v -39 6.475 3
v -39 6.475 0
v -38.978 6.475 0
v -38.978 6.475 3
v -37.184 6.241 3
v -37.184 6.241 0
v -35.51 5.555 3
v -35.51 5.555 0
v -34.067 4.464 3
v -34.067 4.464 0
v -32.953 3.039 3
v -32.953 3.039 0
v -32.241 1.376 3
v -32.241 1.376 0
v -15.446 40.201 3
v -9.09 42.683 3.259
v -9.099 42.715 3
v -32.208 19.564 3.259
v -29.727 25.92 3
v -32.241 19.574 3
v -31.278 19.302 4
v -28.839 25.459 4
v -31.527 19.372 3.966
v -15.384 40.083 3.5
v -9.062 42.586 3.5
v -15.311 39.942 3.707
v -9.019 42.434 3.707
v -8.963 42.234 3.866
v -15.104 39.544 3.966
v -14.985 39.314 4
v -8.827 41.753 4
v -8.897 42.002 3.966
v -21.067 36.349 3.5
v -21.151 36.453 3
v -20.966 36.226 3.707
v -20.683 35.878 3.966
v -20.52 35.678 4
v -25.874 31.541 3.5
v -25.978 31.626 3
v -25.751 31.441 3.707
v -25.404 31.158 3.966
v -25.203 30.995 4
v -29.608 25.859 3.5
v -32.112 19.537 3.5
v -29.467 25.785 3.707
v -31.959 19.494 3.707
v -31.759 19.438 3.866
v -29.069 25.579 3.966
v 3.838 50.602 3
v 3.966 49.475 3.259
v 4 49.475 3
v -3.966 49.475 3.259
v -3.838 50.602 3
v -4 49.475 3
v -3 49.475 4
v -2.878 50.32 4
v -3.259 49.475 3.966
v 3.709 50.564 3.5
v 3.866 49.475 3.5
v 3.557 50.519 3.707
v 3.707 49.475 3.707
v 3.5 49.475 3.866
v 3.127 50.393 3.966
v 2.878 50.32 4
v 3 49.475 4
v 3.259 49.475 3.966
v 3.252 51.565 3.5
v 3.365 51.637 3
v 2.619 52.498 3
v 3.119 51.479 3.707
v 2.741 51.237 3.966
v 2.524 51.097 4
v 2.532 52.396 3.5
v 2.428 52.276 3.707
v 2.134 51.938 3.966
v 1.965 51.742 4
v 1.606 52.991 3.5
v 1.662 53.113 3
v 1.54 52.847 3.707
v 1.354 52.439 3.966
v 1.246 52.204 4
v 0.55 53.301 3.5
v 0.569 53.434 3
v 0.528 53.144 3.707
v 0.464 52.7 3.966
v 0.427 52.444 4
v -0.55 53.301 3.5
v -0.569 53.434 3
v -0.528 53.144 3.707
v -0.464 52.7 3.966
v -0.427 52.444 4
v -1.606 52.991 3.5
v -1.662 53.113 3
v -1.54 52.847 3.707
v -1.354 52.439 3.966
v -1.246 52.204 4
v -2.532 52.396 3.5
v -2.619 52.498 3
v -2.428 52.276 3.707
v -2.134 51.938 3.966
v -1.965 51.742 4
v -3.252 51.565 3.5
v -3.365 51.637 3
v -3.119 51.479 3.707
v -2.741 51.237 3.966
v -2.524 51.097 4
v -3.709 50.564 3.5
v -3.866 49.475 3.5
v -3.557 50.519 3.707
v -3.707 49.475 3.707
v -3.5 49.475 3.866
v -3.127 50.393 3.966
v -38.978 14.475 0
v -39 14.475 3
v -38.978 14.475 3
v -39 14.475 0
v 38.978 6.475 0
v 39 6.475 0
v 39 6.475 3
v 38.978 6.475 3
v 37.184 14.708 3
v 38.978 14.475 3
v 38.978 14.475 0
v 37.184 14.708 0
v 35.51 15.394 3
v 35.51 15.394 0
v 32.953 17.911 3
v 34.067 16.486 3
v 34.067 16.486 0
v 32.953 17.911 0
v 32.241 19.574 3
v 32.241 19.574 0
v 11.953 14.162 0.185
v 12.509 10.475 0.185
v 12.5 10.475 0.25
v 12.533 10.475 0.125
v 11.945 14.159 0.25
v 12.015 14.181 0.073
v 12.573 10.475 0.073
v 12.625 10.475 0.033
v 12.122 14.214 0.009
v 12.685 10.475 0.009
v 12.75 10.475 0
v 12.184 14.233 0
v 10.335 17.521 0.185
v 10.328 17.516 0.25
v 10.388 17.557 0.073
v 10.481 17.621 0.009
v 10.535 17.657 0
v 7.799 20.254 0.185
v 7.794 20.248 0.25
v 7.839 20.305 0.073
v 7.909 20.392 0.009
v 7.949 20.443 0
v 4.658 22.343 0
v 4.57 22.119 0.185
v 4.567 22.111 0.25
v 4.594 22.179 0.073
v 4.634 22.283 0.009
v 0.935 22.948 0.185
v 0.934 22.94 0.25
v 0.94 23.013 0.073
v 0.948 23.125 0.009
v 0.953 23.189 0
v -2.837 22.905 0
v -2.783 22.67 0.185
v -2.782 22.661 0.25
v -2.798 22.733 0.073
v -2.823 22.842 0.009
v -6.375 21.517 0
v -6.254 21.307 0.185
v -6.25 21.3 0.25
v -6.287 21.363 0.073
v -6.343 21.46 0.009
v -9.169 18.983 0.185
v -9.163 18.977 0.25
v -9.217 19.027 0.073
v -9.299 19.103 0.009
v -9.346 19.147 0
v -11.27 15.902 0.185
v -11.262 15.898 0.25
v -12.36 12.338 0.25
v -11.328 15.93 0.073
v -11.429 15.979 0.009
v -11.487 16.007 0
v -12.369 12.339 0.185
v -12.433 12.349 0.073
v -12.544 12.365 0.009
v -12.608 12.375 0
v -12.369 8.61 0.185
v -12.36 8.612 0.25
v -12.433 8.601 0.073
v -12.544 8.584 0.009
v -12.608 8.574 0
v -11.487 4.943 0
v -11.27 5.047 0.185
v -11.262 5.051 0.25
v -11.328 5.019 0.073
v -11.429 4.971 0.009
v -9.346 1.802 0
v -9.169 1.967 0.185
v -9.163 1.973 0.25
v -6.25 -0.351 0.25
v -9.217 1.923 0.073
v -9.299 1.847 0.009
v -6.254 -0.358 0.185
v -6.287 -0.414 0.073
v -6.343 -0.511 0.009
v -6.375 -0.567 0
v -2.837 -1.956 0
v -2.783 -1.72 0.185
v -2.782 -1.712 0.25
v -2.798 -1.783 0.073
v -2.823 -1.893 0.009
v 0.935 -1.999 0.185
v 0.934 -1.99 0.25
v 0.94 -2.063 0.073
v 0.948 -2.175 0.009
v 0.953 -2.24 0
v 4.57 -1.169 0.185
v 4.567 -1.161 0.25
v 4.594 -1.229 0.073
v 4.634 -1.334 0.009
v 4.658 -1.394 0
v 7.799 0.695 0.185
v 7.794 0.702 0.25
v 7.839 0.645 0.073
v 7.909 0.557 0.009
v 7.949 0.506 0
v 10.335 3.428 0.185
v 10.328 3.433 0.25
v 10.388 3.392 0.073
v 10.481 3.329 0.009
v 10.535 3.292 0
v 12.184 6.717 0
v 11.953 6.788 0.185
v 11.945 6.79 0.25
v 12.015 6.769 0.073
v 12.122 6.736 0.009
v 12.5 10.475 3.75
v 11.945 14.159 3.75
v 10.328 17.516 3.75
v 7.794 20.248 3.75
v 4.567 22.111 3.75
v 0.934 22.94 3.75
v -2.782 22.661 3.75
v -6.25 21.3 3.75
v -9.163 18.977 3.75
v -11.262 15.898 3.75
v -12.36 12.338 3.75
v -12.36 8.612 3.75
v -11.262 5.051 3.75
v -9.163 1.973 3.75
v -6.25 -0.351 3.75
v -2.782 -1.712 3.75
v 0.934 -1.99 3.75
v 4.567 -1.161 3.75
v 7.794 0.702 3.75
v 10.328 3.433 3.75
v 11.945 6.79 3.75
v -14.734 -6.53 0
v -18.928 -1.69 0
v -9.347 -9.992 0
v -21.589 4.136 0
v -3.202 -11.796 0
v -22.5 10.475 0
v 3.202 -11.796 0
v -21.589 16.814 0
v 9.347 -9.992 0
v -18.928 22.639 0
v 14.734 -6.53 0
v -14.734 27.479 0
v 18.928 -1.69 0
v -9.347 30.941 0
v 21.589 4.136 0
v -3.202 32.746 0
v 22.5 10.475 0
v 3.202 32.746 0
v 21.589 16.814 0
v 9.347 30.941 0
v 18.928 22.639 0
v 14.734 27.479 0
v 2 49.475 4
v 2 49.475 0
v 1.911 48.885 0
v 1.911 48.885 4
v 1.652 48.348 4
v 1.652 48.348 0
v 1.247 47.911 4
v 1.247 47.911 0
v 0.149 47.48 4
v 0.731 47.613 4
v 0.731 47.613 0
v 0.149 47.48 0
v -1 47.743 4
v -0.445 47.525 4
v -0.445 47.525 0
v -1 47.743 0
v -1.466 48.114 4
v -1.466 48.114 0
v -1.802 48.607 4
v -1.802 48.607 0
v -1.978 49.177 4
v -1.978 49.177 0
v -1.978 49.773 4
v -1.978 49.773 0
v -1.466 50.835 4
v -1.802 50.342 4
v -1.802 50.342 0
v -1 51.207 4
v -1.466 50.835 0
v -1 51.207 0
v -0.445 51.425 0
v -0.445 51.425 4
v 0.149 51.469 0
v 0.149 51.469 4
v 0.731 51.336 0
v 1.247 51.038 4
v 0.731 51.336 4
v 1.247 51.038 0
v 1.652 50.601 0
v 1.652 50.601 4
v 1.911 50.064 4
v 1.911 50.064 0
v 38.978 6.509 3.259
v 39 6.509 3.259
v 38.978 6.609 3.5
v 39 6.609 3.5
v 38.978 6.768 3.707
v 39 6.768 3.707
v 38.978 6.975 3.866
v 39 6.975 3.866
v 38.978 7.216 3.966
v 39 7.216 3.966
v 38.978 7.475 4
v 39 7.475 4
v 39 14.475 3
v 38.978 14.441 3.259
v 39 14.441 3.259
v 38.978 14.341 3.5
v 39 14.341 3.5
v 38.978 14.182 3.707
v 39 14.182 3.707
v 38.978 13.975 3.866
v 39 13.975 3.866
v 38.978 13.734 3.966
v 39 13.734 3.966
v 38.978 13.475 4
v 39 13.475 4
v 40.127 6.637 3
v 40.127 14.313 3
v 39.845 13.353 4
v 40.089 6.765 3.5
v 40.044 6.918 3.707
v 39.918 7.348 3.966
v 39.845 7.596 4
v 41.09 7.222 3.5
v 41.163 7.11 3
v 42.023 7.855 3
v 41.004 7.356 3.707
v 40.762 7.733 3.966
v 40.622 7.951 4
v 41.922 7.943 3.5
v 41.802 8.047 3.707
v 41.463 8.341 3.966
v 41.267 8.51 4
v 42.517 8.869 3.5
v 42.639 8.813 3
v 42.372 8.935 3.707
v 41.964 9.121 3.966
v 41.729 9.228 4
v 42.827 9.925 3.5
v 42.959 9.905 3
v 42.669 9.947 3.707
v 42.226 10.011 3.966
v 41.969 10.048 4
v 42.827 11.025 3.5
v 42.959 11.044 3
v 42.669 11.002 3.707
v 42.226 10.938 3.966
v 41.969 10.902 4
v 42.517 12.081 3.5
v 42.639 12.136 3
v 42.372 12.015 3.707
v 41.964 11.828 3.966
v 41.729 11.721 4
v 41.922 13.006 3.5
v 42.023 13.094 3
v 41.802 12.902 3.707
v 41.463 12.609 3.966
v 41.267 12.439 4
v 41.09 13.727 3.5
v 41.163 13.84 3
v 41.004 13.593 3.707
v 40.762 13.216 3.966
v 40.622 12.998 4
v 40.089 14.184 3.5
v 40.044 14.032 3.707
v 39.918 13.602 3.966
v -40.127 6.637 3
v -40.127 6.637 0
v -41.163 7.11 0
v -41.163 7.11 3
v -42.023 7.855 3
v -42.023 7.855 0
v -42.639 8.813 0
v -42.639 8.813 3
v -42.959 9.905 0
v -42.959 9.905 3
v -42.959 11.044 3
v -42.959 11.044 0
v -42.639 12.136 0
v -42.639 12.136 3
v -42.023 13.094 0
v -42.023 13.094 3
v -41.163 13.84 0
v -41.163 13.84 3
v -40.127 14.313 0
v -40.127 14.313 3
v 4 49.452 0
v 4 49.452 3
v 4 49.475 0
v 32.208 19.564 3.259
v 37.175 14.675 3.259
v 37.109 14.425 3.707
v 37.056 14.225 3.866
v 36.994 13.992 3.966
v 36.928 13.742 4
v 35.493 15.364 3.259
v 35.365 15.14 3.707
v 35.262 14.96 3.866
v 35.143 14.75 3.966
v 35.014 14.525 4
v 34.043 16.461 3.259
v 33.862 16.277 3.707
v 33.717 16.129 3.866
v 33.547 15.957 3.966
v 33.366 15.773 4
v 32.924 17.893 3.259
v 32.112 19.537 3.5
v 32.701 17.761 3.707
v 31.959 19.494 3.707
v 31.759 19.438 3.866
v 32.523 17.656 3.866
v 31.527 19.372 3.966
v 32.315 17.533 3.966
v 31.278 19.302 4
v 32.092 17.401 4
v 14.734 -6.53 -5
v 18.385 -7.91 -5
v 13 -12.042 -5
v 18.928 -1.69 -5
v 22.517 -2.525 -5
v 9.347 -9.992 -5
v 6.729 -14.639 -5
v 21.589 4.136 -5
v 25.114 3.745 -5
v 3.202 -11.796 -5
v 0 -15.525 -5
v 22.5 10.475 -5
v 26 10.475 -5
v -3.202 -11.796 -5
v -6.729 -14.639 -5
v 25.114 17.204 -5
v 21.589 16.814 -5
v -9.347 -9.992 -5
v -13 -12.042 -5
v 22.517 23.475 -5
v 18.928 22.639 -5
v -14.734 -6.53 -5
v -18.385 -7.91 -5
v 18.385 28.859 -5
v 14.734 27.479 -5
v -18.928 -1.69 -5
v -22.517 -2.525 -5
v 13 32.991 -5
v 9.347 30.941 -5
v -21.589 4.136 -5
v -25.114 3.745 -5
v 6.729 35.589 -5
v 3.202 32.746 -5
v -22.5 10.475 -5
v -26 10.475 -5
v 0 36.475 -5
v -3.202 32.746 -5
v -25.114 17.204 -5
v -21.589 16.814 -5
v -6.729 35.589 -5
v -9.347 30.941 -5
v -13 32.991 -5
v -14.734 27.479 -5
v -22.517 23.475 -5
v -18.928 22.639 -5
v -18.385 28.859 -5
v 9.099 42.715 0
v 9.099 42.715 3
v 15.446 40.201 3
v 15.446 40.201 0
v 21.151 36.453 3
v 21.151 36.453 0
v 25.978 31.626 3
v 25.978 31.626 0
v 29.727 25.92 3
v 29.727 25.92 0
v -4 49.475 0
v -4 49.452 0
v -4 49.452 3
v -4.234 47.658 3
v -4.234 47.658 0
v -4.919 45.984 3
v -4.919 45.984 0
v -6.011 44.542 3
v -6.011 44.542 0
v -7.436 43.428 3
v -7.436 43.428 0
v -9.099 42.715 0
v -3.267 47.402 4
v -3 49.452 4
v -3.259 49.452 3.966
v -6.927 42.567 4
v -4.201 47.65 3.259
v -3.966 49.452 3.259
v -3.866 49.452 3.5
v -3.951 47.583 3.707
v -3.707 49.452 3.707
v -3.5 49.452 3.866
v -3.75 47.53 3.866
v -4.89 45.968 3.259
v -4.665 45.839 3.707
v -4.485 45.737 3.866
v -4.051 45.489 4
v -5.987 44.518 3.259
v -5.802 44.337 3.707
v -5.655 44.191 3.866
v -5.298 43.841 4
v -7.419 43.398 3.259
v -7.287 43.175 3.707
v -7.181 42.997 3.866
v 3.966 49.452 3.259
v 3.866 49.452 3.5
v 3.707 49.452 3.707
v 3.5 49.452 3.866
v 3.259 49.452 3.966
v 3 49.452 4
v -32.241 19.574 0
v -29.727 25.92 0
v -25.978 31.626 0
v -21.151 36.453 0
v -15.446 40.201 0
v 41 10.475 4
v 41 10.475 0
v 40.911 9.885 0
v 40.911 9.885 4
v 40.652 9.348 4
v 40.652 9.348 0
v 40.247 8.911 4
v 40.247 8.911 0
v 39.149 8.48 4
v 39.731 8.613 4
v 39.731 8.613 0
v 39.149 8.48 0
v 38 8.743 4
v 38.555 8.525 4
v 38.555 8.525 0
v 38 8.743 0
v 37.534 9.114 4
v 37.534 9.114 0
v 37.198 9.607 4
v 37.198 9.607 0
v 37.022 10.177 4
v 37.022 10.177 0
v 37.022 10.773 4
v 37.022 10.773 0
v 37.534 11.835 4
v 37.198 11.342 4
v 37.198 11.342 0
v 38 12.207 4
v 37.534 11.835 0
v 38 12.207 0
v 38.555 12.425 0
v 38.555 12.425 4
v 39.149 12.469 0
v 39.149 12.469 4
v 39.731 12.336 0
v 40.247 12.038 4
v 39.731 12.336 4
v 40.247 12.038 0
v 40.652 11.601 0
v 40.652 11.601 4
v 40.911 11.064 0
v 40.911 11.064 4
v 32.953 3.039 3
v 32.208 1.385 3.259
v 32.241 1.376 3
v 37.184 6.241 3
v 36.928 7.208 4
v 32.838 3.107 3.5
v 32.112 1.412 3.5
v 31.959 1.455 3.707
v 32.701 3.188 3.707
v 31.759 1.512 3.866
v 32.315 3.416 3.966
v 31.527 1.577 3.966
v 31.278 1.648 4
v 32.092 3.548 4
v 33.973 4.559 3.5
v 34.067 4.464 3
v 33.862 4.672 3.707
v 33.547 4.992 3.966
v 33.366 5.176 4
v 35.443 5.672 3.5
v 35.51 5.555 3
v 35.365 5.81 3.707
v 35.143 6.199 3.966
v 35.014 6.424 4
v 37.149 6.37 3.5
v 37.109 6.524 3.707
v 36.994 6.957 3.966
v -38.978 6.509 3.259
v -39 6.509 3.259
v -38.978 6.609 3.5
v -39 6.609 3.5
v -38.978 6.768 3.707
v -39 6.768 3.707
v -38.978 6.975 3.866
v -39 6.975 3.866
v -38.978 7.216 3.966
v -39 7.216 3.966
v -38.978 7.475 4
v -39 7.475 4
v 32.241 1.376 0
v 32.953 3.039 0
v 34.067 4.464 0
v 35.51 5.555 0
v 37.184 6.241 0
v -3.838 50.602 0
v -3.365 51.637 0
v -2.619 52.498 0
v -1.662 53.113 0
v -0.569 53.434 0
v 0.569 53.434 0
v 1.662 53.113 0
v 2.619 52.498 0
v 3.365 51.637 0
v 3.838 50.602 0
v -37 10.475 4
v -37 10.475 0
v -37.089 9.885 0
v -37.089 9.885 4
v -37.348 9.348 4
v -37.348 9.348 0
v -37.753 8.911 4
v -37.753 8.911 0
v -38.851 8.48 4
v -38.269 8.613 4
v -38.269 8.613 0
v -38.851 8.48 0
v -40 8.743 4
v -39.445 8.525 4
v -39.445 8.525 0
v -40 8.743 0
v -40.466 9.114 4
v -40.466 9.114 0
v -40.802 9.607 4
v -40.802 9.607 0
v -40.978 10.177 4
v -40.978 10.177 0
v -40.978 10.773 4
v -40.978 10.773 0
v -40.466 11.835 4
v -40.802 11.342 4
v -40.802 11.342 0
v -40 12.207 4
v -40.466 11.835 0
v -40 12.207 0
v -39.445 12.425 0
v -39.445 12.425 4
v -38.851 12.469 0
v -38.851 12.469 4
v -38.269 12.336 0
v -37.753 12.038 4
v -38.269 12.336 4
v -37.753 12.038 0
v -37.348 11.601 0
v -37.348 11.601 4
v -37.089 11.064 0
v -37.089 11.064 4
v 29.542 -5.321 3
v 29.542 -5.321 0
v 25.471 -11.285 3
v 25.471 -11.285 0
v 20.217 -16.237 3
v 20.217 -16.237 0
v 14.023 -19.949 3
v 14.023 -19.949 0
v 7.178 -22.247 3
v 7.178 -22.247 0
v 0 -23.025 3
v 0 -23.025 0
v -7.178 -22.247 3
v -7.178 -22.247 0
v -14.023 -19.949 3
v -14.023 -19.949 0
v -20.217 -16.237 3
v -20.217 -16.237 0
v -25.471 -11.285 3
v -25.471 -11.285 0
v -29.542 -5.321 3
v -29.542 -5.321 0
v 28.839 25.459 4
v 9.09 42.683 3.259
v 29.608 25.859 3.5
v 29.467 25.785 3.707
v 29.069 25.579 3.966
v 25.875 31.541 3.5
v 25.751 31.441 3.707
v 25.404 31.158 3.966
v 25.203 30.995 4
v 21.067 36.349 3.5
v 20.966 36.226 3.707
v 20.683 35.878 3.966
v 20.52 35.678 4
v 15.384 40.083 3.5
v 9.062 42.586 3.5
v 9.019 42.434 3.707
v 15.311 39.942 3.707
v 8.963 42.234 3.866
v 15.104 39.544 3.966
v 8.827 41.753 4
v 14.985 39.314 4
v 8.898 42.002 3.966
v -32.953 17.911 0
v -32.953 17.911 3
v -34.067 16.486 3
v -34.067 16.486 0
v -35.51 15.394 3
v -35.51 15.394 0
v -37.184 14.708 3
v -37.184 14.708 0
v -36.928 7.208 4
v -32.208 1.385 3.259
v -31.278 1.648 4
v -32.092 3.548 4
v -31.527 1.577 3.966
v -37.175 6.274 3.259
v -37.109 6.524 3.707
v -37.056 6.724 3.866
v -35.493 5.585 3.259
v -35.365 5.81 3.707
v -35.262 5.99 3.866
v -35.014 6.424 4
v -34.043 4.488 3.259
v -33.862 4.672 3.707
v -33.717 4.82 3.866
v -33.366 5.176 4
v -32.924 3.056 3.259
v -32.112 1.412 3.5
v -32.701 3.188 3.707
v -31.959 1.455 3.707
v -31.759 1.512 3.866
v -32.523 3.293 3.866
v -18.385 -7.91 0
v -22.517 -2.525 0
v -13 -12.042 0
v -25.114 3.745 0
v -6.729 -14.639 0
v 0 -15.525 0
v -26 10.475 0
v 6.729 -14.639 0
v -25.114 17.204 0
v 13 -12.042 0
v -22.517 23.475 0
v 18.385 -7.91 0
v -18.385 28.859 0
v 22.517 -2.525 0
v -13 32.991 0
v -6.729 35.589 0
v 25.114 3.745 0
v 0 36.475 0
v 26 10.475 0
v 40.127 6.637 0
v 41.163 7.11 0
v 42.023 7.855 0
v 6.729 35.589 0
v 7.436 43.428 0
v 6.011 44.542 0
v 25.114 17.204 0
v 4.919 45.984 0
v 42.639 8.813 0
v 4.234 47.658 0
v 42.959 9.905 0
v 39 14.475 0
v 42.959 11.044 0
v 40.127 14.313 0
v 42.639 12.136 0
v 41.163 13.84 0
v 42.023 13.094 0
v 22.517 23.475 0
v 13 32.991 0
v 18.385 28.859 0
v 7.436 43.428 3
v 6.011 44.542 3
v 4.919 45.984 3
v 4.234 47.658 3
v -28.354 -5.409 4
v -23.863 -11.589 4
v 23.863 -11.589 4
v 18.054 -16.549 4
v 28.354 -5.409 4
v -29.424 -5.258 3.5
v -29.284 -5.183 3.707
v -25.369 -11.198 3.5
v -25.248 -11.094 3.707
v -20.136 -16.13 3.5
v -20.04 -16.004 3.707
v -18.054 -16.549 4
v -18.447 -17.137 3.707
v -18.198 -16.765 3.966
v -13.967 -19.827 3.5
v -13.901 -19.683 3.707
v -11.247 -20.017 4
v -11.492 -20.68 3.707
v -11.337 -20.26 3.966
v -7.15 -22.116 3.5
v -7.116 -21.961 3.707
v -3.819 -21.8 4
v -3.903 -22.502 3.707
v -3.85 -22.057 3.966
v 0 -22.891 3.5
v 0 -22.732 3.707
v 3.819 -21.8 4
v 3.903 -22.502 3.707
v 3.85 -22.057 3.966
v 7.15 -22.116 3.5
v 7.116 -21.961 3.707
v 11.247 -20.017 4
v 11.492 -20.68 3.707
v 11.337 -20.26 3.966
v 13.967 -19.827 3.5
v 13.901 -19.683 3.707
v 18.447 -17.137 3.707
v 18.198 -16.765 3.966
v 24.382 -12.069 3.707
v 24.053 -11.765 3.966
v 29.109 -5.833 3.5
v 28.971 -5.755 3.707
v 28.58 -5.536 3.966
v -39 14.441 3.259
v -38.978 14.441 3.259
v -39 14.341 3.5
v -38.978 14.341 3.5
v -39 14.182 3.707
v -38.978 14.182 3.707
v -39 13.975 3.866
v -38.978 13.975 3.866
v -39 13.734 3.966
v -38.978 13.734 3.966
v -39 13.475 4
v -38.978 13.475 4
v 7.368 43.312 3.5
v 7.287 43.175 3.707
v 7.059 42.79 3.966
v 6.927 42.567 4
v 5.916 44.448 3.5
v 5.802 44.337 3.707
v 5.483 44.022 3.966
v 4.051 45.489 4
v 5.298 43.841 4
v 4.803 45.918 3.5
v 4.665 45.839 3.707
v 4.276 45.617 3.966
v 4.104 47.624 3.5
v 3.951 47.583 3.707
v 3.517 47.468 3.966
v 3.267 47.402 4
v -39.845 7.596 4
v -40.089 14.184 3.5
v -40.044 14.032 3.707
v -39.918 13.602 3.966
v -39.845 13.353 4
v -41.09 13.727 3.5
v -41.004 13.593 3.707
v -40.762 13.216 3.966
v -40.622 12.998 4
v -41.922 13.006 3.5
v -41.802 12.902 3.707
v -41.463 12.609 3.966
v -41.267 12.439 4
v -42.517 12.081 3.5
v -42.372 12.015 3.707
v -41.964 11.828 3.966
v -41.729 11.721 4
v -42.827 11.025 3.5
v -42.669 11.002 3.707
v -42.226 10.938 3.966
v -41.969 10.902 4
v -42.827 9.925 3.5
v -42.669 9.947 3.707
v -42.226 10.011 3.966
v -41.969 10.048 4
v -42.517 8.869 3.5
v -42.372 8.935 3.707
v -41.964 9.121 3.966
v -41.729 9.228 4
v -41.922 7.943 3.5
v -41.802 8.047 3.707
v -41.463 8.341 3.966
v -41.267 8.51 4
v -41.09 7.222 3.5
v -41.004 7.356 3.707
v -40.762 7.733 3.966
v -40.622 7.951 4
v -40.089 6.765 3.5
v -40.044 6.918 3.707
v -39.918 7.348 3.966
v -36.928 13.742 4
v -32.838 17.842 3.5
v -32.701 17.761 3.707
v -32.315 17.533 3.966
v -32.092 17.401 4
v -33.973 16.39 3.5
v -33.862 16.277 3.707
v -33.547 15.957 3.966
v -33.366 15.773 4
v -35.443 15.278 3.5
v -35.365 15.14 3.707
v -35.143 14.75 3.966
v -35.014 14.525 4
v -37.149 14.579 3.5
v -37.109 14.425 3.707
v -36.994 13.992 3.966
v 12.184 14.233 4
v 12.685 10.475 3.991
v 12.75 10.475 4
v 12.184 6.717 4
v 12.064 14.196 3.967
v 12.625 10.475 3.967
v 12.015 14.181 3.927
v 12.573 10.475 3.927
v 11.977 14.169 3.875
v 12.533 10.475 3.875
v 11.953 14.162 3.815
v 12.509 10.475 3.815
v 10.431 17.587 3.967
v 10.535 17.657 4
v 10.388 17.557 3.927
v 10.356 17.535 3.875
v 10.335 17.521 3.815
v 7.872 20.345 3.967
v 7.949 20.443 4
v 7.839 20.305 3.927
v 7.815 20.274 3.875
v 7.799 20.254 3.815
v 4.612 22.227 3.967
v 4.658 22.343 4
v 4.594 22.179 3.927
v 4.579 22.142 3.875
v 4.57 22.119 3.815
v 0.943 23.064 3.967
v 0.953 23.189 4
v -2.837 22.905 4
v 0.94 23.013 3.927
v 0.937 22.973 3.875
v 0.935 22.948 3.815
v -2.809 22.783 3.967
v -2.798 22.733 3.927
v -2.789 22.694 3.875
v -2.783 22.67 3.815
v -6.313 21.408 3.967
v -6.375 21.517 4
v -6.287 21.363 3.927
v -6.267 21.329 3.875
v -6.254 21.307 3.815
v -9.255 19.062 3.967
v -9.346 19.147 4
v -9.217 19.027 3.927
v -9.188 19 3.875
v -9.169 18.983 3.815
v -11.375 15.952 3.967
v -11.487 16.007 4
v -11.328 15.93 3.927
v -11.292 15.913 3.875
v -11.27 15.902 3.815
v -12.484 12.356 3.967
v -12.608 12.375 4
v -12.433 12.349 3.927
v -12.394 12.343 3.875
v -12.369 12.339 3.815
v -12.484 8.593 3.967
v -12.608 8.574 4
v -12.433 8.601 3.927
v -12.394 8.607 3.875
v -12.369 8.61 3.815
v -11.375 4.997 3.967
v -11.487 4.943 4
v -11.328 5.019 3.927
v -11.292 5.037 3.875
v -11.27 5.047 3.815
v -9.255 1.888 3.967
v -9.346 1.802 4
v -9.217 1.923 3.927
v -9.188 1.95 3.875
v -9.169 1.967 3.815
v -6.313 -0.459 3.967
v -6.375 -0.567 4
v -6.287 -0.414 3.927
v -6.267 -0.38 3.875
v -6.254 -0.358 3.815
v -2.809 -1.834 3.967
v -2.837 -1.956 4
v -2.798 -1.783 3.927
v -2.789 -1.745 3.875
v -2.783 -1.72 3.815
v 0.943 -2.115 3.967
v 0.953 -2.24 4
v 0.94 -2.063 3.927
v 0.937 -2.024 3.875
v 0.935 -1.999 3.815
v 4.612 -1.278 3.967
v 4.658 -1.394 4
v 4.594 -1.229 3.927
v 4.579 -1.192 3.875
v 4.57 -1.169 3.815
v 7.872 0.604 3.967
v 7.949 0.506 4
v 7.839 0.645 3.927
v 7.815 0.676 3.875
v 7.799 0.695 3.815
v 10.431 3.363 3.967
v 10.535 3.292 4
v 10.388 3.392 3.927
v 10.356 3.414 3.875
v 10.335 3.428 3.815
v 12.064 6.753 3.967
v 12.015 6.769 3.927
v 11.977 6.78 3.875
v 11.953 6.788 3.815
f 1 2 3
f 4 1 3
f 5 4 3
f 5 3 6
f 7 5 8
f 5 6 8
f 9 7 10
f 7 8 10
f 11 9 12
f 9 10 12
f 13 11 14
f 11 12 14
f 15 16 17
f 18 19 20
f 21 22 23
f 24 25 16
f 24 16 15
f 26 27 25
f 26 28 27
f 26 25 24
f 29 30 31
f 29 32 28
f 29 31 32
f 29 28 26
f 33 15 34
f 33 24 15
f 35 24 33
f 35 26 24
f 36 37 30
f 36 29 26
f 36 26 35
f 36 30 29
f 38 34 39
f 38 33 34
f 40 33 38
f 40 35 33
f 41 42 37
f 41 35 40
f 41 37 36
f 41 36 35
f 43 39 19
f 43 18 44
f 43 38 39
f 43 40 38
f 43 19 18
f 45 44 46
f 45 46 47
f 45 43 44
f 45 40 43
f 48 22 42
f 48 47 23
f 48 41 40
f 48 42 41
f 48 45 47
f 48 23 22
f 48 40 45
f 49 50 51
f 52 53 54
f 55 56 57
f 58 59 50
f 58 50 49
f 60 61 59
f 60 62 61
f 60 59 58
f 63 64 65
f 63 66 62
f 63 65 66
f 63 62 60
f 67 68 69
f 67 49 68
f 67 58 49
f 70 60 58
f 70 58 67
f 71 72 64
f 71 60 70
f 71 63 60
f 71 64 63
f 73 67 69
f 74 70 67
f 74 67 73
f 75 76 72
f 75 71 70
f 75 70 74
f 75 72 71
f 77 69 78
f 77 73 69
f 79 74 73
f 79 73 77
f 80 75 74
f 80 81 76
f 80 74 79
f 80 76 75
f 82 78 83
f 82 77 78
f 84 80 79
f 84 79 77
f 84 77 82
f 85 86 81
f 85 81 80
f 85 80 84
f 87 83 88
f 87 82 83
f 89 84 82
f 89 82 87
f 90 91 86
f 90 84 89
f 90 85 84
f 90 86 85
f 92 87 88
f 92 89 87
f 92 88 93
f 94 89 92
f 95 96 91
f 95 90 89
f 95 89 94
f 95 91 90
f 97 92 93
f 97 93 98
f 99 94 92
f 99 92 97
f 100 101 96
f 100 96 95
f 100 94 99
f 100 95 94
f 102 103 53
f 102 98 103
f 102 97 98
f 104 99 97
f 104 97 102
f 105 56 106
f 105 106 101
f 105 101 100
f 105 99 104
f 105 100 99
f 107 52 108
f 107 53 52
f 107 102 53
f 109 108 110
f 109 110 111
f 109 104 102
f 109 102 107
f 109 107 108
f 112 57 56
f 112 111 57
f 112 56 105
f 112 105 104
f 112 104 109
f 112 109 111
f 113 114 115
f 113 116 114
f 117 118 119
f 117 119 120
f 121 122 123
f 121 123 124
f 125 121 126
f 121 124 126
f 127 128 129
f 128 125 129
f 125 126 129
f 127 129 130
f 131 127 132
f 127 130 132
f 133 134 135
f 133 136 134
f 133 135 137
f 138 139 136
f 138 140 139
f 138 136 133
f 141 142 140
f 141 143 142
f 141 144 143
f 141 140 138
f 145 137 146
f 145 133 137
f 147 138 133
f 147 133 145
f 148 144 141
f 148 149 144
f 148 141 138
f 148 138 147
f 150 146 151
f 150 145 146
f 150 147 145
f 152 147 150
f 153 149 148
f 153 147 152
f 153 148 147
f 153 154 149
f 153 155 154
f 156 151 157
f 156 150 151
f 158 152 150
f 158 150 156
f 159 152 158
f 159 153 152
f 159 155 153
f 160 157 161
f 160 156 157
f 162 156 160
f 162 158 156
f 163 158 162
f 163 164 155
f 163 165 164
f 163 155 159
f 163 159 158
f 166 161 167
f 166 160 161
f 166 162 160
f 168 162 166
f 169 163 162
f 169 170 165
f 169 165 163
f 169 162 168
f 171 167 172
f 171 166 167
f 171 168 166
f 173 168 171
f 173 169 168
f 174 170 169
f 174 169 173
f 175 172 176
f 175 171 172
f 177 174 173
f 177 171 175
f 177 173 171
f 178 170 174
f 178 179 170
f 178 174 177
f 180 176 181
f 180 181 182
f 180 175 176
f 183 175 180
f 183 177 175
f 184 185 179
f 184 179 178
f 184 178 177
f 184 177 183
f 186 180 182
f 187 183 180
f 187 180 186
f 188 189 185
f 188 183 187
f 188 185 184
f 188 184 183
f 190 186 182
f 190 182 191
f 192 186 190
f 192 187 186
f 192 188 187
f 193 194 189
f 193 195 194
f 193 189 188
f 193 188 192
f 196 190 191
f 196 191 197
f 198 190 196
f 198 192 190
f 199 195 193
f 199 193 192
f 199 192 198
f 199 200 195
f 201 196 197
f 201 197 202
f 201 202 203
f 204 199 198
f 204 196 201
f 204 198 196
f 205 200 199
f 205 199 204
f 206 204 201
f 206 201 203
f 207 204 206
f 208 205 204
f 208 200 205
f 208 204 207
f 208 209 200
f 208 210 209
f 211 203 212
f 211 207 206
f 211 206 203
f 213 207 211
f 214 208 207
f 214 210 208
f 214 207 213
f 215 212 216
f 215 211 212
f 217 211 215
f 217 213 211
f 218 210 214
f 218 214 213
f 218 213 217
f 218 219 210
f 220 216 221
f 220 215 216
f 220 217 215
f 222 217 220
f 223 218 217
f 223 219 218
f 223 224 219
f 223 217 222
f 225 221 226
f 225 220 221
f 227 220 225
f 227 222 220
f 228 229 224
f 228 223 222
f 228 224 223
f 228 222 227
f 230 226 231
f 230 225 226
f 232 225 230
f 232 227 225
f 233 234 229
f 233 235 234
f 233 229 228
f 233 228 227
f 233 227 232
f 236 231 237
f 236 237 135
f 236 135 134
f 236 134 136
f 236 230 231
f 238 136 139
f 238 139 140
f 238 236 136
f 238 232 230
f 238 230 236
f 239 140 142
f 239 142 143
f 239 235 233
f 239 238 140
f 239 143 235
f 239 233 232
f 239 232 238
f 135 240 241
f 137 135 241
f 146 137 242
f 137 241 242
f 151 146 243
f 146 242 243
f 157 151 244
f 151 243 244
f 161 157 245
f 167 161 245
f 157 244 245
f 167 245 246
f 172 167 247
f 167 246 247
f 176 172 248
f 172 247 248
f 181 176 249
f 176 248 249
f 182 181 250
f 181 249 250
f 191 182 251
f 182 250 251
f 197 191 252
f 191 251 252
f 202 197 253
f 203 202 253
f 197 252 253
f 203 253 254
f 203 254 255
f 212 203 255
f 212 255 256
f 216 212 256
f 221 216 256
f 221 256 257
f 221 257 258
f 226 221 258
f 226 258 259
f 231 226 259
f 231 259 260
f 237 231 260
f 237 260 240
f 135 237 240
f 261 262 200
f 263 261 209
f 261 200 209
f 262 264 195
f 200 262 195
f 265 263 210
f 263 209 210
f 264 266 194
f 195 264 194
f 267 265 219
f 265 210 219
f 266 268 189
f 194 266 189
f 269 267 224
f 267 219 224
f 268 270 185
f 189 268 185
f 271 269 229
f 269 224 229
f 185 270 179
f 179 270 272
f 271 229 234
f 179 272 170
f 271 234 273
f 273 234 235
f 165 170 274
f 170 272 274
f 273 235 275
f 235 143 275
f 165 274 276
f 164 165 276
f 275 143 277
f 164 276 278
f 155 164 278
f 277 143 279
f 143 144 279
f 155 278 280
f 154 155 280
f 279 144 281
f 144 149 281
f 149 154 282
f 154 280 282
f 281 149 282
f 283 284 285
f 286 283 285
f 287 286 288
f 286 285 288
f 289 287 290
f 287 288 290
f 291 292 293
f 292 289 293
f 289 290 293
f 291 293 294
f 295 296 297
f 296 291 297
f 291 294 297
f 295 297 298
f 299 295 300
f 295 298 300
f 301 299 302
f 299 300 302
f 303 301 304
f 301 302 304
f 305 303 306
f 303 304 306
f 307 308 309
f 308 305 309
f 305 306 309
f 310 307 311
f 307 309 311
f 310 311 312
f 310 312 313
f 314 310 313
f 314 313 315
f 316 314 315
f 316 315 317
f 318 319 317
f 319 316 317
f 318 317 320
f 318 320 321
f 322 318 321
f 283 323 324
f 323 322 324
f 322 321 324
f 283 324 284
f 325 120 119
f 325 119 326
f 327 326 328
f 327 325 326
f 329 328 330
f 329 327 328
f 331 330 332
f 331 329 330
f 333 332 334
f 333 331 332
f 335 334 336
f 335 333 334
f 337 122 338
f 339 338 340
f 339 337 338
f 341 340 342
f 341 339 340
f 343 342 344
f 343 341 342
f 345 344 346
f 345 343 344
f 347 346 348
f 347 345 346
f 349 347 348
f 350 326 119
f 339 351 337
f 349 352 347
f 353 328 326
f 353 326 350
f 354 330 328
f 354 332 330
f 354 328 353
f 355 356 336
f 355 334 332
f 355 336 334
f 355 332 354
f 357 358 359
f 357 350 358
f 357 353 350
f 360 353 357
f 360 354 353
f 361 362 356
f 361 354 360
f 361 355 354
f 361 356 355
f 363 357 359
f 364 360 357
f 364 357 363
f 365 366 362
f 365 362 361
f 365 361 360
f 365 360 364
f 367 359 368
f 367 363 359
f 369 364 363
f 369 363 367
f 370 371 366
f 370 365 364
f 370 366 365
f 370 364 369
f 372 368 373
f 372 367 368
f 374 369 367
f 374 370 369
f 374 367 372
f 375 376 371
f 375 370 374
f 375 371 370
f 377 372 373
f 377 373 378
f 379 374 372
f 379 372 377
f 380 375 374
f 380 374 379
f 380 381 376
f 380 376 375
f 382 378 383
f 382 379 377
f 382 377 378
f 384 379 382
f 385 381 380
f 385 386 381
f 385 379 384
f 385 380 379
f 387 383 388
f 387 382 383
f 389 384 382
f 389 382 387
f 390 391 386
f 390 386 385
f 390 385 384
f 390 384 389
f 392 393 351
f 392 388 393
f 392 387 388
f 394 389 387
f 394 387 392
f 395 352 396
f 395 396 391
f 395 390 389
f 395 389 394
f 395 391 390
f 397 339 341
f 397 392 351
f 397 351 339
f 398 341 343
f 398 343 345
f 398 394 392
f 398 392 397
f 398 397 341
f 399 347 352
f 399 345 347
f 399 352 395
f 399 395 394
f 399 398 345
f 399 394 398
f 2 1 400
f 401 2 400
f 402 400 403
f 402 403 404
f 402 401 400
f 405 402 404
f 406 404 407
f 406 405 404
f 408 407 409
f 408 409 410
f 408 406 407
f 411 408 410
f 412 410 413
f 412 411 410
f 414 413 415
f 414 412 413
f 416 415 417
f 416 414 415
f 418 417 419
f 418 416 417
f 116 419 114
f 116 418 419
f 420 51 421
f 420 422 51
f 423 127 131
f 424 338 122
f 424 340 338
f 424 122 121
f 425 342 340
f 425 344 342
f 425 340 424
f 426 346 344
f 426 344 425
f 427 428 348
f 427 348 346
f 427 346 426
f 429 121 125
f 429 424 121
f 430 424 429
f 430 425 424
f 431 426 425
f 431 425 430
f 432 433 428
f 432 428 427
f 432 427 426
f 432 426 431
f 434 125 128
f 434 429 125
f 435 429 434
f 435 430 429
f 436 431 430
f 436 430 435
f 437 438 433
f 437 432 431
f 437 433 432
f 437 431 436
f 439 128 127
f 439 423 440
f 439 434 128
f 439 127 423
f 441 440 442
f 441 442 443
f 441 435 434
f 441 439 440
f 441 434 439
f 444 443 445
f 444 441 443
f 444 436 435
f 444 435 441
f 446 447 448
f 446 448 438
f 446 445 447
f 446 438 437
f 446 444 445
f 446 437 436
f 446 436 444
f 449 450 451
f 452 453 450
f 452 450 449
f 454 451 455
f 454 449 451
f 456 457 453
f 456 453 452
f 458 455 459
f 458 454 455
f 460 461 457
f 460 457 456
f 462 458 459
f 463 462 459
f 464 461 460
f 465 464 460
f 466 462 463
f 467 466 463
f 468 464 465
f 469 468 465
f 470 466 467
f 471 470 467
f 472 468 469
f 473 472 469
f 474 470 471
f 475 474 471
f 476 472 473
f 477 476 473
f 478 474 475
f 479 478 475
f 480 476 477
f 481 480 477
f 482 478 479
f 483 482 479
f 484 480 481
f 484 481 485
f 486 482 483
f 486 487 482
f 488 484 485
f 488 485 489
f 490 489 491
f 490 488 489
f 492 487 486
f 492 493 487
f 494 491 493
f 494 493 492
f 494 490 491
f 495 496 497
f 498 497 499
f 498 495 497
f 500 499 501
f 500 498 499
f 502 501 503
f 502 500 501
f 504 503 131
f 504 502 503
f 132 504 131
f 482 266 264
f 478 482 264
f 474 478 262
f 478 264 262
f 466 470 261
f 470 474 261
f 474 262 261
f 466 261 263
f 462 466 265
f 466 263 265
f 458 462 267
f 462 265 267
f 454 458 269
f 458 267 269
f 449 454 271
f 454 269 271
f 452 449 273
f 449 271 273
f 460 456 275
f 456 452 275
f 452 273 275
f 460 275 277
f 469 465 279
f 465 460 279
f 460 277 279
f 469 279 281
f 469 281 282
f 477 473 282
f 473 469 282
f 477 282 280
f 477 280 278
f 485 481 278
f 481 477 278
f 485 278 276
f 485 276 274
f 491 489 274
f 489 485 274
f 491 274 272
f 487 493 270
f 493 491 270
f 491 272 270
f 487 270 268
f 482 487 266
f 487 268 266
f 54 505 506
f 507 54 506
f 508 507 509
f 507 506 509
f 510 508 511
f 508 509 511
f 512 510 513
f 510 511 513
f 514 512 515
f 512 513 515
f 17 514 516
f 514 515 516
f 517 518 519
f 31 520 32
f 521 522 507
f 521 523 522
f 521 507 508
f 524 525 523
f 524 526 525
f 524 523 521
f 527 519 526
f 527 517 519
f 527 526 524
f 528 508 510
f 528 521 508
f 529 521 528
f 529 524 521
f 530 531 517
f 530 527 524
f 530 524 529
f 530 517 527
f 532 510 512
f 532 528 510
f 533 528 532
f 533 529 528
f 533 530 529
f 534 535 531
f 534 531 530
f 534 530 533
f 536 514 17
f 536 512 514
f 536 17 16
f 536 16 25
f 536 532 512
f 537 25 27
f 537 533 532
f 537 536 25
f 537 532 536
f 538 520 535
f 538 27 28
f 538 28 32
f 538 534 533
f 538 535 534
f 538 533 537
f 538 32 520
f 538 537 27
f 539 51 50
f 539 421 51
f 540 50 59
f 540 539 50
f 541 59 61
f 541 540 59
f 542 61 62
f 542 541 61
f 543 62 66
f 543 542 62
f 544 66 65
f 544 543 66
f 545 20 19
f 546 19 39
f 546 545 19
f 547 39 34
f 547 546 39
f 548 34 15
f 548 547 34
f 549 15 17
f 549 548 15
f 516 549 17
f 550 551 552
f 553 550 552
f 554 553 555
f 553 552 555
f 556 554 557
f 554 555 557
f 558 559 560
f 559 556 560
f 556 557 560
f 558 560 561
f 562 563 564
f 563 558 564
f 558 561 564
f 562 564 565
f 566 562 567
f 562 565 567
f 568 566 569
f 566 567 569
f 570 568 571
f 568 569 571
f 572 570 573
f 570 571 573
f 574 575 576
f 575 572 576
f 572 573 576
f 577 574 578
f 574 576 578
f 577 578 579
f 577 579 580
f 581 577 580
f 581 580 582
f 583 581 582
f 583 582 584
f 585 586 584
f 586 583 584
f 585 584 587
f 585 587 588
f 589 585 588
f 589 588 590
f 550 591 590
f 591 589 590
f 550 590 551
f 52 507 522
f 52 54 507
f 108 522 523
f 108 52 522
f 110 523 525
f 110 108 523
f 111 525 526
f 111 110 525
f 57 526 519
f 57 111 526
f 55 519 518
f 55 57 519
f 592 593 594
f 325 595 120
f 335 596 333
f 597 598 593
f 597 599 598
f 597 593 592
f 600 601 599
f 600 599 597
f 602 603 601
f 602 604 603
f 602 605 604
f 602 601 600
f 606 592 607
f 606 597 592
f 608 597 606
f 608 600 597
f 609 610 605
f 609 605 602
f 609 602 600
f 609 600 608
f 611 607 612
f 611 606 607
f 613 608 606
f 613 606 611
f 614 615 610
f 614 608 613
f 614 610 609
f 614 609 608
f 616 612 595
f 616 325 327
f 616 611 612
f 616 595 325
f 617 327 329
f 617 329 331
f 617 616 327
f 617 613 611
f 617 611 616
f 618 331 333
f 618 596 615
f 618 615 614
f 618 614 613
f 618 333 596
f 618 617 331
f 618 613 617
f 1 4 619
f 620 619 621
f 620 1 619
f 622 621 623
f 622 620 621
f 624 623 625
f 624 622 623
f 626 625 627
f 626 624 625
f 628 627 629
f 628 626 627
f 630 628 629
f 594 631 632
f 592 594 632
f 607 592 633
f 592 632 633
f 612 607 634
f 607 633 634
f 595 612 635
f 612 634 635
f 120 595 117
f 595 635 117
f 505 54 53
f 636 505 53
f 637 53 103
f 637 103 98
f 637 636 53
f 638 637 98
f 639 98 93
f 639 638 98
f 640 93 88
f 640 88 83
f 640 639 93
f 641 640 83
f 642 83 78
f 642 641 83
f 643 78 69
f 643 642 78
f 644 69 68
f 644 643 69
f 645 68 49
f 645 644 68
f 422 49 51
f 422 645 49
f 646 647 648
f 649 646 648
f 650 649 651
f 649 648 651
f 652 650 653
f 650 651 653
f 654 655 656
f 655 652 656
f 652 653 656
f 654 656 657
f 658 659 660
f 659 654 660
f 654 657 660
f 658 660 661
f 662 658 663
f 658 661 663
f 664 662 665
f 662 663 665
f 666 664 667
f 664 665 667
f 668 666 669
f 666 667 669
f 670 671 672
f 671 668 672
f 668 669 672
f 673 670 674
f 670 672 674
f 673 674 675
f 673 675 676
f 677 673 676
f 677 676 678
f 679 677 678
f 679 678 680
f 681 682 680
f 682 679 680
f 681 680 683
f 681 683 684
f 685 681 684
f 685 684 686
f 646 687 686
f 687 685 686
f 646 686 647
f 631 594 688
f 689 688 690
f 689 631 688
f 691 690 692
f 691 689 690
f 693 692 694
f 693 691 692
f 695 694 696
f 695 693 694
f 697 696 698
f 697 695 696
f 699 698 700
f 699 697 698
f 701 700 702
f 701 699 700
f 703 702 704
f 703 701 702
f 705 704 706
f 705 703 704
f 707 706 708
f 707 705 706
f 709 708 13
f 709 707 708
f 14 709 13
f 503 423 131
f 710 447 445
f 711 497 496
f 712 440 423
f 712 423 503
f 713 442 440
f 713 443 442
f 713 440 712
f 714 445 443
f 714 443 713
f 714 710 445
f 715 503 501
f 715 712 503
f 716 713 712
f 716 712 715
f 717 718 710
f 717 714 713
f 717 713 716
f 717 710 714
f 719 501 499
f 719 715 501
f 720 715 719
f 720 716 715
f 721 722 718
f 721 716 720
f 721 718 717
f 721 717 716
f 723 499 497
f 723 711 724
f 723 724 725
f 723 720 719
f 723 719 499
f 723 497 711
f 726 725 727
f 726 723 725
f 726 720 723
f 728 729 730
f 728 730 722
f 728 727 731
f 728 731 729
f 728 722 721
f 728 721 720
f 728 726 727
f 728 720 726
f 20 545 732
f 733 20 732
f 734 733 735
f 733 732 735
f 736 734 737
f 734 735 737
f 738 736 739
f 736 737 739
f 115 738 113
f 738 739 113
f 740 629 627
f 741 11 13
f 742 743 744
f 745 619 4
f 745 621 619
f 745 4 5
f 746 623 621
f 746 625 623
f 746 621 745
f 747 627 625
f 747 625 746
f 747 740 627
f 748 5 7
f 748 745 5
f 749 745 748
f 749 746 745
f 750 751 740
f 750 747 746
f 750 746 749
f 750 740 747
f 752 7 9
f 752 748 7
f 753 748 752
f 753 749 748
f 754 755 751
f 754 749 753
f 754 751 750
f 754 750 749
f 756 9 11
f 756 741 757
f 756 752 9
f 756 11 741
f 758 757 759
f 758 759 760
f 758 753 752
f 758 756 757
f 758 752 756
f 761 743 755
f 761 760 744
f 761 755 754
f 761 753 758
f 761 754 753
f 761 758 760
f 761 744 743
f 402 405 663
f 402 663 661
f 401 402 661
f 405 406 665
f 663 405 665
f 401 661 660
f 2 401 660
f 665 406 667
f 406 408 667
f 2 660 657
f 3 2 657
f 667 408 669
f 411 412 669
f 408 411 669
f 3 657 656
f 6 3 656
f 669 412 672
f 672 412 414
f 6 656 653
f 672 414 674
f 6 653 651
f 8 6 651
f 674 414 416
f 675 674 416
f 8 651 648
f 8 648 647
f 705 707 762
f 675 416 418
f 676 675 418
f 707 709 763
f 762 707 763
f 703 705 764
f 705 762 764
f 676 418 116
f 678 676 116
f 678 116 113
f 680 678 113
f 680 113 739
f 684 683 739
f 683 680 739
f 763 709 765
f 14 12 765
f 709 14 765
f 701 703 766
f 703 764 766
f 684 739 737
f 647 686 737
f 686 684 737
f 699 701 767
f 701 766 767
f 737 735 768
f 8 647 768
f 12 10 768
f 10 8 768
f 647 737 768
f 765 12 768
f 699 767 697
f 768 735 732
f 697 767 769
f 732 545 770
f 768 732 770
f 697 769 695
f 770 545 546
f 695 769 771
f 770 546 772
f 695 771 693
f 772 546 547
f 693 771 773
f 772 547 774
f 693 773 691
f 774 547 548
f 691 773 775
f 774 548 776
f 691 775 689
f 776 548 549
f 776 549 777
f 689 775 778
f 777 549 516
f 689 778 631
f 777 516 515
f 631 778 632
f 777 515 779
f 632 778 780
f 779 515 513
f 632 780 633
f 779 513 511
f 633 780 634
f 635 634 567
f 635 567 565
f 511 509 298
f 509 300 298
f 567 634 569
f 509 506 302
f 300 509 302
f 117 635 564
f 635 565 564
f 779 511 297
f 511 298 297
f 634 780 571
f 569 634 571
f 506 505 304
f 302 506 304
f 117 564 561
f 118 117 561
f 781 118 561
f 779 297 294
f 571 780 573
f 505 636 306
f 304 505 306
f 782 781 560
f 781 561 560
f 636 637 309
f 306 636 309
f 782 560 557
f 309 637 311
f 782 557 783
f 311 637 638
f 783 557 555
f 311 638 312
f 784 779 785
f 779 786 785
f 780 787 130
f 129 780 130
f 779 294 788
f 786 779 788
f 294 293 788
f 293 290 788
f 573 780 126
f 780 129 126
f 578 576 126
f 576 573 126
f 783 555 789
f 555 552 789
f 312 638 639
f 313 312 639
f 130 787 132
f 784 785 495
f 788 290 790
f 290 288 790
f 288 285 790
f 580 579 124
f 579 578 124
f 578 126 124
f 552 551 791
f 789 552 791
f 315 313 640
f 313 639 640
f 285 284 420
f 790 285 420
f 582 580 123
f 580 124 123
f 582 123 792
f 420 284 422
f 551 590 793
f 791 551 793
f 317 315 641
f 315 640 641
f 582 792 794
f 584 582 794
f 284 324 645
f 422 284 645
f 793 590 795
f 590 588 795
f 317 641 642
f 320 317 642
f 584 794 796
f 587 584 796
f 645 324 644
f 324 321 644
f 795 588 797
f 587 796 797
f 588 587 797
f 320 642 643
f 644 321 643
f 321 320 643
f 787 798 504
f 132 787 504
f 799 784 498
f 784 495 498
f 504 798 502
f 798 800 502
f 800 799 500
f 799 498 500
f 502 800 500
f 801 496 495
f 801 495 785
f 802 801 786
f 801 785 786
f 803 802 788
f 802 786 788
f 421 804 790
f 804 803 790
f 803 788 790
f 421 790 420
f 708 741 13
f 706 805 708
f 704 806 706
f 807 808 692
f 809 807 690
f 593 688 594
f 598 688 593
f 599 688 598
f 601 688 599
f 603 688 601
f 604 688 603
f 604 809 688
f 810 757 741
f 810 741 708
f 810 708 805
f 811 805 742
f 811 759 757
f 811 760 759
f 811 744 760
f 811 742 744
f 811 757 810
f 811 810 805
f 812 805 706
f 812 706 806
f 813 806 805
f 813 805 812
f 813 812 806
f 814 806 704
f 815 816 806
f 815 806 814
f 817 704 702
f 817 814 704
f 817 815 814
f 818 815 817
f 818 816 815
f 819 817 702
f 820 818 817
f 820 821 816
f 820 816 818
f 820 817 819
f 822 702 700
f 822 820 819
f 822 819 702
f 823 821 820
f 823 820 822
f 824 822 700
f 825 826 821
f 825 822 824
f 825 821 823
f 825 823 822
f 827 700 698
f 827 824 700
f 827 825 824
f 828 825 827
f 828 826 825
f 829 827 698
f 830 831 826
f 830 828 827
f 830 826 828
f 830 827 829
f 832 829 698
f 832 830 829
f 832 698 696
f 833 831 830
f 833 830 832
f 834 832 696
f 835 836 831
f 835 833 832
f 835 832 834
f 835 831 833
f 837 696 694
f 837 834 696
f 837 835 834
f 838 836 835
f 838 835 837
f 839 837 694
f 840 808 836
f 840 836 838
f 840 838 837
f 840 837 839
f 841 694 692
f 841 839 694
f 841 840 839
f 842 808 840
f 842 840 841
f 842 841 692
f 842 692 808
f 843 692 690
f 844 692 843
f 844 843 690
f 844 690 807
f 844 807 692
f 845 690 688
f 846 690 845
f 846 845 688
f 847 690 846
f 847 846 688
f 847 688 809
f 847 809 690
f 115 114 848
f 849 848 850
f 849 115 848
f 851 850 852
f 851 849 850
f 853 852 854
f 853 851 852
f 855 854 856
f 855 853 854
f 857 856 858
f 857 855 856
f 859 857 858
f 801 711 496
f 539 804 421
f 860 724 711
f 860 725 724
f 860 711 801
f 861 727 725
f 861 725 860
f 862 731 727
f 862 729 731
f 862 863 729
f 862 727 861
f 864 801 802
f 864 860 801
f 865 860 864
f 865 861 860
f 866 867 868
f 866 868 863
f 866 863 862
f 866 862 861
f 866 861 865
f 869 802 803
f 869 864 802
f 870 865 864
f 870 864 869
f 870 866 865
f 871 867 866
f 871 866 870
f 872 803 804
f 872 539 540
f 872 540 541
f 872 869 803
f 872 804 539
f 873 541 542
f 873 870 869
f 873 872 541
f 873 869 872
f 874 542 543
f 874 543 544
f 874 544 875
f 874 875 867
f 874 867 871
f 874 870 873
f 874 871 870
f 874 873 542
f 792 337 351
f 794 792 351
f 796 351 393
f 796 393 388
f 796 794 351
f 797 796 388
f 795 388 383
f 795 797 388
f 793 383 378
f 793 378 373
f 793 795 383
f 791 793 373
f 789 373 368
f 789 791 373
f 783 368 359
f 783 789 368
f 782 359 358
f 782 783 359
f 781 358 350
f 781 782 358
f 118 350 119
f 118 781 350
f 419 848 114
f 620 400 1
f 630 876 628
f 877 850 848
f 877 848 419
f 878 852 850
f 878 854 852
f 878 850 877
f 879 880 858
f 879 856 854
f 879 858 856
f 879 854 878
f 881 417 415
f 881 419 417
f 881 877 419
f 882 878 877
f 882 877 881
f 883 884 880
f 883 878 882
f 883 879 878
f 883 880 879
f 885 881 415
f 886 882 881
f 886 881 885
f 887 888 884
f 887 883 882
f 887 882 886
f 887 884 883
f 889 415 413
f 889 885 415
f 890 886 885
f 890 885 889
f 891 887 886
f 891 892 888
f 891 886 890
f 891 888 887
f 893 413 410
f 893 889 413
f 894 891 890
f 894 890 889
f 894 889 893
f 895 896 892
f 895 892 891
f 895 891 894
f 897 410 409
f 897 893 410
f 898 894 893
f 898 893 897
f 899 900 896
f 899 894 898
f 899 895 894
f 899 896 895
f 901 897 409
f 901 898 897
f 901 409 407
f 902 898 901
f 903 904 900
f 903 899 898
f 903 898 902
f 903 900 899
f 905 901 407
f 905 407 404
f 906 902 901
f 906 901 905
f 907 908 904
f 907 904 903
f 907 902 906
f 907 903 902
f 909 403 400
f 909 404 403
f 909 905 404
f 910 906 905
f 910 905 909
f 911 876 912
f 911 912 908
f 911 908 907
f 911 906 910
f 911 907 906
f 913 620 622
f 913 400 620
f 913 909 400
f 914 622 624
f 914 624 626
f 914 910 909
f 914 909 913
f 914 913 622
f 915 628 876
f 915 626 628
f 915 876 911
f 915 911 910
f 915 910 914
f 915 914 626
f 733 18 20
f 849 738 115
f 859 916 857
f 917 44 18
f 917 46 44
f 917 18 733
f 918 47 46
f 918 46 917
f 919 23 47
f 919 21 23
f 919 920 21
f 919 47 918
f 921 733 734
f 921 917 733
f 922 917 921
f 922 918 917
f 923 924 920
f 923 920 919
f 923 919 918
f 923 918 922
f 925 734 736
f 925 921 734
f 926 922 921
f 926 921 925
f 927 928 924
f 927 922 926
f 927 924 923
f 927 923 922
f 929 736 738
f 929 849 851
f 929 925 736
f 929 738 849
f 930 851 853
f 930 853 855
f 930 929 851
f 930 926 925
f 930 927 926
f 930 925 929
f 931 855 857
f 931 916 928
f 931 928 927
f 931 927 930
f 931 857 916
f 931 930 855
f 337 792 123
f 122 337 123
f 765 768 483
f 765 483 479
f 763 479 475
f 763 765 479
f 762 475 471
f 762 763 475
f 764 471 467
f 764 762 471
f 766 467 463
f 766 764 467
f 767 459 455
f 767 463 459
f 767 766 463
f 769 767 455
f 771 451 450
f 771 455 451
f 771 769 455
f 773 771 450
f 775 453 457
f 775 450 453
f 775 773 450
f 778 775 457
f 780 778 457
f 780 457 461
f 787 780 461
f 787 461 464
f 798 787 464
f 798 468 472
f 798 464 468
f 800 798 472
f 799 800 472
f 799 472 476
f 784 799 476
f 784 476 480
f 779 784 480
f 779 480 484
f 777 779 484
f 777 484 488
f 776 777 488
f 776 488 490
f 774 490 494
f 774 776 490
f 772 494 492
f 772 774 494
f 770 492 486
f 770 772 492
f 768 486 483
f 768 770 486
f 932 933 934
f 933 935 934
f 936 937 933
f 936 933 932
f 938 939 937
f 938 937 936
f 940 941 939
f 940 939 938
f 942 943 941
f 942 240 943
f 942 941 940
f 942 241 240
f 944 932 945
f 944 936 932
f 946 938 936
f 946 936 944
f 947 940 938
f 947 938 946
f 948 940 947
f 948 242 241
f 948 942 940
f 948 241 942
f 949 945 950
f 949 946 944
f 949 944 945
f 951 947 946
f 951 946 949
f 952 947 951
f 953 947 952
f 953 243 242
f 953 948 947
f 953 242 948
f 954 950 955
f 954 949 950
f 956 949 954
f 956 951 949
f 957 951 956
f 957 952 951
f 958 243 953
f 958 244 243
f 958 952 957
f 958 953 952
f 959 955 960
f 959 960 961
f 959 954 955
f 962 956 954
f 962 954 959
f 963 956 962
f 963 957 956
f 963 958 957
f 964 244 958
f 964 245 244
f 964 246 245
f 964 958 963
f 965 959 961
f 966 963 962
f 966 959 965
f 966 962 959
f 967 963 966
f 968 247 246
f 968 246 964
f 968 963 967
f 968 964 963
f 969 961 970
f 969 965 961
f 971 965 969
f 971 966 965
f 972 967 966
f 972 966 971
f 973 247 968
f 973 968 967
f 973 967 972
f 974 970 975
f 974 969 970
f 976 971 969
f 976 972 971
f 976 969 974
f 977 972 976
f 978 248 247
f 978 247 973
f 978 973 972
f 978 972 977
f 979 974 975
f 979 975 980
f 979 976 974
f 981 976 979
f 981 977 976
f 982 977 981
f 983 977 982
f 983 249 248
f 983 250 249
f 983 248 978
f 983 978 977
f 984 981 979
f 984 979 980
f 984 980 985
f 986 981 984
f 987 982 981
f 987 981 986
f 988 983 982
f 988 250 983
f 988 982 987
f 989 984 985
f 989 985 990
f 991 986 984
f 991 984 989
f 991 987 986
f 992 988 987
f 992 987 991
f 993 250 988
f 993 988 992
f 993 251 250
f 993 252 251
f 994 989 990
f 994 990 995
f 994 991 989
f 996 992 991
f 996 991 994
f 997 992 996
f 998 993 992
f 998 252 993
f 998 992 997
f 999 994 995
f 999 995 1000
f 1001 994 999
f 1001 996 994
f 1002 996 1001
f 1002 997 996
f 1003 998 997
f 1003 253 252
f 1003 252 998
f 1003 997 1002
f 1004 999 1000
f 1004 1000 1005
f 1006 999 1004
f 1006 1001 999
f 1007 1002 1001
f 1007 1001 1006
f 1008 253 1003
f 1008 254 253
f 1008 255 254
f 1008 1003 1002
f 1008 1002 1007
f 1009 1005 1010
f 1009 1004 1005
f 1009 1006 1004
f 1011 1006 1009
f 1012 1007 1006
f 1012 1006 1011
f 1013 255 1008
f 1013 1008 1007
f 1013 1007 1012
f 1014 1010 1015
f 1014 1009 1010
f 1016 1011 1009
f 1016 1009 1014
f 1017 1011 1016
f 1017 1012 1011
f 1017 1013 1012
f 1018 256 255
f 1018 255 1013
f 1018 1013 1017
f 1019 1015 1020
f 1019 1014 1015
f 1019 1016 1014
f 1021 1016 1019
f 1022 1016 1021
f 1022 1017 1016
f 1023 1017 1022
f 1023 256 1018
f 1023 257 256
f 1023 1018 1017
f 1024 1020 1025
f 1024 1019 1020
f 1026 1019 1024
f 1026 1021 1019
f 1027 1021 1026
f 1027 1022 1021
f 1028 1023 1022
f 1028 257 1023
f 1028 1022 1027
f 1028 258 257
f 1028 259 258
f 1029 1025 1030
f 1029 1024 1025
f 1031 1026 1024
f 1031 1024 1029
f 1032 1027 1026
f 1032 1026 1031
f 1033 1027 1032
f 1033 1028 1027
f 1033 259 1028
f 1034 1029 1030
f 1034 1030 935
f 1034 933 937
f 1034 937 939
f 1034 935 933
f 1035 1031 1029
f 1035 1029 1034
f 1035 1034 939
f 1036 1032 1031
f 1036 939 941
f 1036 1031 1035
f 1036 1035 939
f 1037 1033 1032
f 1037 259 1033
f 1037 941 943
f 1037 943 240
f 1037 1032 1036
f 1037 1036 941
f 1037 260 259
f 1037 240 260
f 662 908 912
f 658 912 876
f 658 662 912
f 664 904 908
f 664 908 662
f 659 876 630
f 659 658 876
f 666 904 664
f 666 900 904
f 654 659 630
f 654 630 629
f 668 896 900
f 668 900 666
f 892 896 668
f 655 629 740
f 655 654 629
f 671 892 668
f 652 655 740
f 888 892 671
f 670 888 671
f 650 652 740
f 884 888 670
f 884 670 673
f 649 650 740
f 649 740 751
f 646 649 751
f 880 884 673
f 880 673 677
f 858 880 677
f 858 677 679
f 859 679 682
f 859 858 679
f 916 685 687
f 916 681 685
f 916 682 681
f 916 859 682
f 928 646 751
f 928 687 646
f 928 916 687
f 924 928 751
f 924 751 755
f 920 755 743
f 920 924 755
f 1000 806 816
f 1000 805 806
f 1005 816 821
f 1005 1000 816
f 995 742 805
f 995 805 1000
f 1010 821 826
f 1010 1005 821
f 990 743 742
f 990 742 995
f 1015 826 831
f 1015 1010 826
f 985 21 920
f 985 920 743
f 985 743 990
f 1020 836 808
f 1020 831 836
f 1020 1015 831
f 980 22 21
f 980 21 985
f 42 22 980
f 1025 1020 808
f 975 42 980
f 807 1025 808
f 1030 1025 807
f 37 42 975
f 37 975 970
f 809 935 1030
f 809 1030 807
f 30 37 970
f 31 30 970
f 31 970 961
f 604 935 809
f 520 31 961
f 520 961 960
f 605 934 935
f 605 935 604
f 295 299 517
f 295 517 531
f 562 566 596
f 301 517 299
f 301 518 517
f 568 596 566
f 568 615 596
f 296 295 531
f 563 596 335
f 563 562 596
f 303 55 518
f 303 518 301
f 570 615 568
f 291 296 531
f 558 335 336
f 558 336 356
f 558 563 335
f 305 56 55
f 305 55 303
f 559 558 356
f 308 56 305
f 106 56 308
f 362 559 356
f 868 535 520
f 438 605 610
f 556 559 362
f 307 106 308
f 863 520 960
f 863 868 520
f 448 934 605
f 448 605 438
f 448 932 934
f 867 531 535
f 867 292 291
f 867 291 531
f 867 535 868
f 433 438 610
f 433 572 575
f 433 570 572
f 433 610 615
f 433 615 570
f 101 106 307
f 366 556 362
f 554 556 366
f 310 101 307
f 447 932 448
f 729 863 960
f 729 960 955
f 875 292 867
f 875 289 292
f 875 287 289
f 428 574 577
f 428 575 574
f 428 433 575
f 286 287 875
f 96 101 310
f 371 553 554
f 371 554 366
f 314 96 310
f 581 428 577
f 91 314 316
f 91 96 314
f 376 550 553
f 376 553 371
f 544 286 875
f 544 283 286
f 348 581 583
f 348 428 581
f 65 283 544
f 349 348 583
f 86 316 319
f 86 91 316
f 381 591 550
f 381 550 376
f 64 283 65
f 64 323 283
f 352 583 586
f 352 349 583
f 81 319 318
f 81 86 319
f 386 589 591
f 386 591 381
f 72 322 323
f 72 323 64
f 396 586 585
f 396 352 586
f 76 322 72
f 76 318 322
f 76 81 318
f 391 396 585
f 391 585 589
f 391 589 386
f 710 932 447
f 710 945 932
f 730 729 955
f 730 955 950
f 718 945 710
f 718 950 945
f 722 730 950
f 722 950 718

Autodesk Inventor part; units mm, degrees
ref_plane "YZ Plane" through (0, 0, 0) normal (1, 0, 0) x (0, 1, 0)
ref_plane "XZ Plane" through (0, 0, 0) normal (0, 1, 0) x (-1, 0, 0)
ref_plane "XY Plane" through (0, 0, 0) normal (0, 0, 1) x (1, 0, 0)
sketch "Sketch1" plane through (0, 0, 0) normal (0, 0, 1) x (1, 0, 0)
  circle A0 centre (0, 10.4747) radius 26 construction
  arc A1 (2.8969, 46.7164) -> (-2.8969, 46.7164) centre (0, 49.4747) ccw construction
  circle A2 centre (0, 49.4747) radius 2 construction
  arc A3 (36.3889, 7.4445) -> (36.2417, 13.3716) centre (39, 10.4747) ccw construction
  circle A4 centre (39, 10.4747) radius 2 construction
  arc A5 (-36.2417, 13.3716) -> (-36.3889, 7.4445) centre (-39, 10.4747) ccw construction
  circle A6 centre (-39, 10.4747) radius 2 construction
  arc A7 (33.5, 10.4747) -> (-33.5, 10.4747) centre (0, 10.4747) ccw construction
  arc A8 (4, 49.4747) -> (-4, 49.4747) centre (0, 49.4747) ccw
  circle A9 centre (0, 49.4747) radius 2
  arc A10 (39, 6.4747) -> (39, 14.4747) centre (39, 10.4747) ccw
  circle A11 centre (39, 10.4747) radius 2
  circle A12 centre (-39, 10.4747) radius 2
  arc A13 (-39, 14.4747) -> (-39, 6.4747) centre (-39, 10.4747) ccw
  line L0 (-4, 49.4747) -> (-4, 49.4522)
  line L1 (4, 49.4747) -> (4, 49.4522)
  arc A14 (-9.0988, 42.7154) -> (-4, 49.4522) centre (-11, 49.4522) ccw
  arc A15 (4, 49.4522) -> (9.0988, 42.7154) centre (11, 49.4522) ccw
  line L2 (-39, 14.4747) -> (-38.9776, 14.4747)
  line L3 (-39, 6.4747) -> (-38.9776, 6.4747)
  line L4 (39, 14.4747) -> (38.9776, 14.4747)
  line L5 (39, 6.4747) -> (38.9776, 6.4747)
  arc A16 (-9.0988, 42.7154) -> (-32.2407, 19.5735) centre (0, 10.4747) ccw
  arc A17 (-32.2407, 1.3759) -> (32.2407, 1.3759) centre (0, 10.4747) ccw
  arc A18 (32.2407, 19.5735) -> (9.0988, 42.7154) centre (0, 10.4747) ccw
  arc A19 (-38.9776, 14.4747) -> (-32.2407, 19.5735) centre (-38.9776, 21.4747) ccw
  arc A20 (-32.2407, 1.3759) -> (-38.9776, 6.4747) centre (-38.9776, -0.5253) ccw
  arc A21 (38.9776, 6.4747) -> (32.2407, 1.3759) centre (38.9776, -0.5253) ccw
  arc A22 (32.2407, 19.5735) -> (38.9776, 14.4747) centre (38.9776, 21.4747) ccw
  point P0 (0, 0)
  point P1 (-33.2603, 14.4747)
  point P2 (-33.2603, 6.4747)
  point P3 (33.2603, 14.4747)
  point P4 (33.2603, 6.4747)
  dimension "d1" = 7
  dimension "d2" = 7
  dimension "d3" = 7
  dimension "d4" = 33.5
  dimension "d5" = 33.5
  dimension "d6" = 33.5
extrude "Extrusion1" add sketch "Sketch1" along normal blind 4
fillet "Fillet1" radius 1 18 edges at (-34.7531, 15.8931, 4) (-38.9888, 14.4747, 4) (-43, 10.4747, 4) (-38.9888, 6.4747, 4) (-34.7531, 5.0563, 4) (0, -23.0253, 4) (34.7531, 5.0563, 4) (38.9888, 6.4747, 4) (43, 10.4747, 4) (38.9888, 14.4747, 4) (34.7531, 15.8931, 4) (23.6881, 34.1628, 4) (5.4184, 45.2278, 4) (4, 49.4635, 4) (0, 53.4747, 4) (-4, 49.4635, 4) (-5.4184, 45.2278, 4) (-23.6881, 34.1628, 4)
sketch "Sketch2" plane through (0, 0, 0) normal (0, 0, -1) x (-1, 0, 0)
  circle A0 centre (0, 10.4747) radius 26 construction
  circle A1 centre (0, 10.4747) radius 26
  circle A2 centre (0, 10.4747) radius 22.5
  point P0 (0, 0)
  dimension "d12" = 45
extrude "Extrusion2" add sketch "Sketch2" along normal blind 5
sketch "Sketch3" plane through (0, 0, 4) normal (0, 0, 1) x (1, 0, 0)
  circle A0 centre (0, 10.4747) radius 12.5 construction
  circle A1 centre (0, 10.4747) radius 12.5
  point P0 (0, 0)
extrude "Extrusion3" cut sketch "Sketch3" against normal up to next
fillet "Fillet2" radius 0.25 2 edges at (-12.5, 10.4747, 0) (-12.5, 10.4747, 4)
properties part number "PillowCover" material "Steel, Mild"
